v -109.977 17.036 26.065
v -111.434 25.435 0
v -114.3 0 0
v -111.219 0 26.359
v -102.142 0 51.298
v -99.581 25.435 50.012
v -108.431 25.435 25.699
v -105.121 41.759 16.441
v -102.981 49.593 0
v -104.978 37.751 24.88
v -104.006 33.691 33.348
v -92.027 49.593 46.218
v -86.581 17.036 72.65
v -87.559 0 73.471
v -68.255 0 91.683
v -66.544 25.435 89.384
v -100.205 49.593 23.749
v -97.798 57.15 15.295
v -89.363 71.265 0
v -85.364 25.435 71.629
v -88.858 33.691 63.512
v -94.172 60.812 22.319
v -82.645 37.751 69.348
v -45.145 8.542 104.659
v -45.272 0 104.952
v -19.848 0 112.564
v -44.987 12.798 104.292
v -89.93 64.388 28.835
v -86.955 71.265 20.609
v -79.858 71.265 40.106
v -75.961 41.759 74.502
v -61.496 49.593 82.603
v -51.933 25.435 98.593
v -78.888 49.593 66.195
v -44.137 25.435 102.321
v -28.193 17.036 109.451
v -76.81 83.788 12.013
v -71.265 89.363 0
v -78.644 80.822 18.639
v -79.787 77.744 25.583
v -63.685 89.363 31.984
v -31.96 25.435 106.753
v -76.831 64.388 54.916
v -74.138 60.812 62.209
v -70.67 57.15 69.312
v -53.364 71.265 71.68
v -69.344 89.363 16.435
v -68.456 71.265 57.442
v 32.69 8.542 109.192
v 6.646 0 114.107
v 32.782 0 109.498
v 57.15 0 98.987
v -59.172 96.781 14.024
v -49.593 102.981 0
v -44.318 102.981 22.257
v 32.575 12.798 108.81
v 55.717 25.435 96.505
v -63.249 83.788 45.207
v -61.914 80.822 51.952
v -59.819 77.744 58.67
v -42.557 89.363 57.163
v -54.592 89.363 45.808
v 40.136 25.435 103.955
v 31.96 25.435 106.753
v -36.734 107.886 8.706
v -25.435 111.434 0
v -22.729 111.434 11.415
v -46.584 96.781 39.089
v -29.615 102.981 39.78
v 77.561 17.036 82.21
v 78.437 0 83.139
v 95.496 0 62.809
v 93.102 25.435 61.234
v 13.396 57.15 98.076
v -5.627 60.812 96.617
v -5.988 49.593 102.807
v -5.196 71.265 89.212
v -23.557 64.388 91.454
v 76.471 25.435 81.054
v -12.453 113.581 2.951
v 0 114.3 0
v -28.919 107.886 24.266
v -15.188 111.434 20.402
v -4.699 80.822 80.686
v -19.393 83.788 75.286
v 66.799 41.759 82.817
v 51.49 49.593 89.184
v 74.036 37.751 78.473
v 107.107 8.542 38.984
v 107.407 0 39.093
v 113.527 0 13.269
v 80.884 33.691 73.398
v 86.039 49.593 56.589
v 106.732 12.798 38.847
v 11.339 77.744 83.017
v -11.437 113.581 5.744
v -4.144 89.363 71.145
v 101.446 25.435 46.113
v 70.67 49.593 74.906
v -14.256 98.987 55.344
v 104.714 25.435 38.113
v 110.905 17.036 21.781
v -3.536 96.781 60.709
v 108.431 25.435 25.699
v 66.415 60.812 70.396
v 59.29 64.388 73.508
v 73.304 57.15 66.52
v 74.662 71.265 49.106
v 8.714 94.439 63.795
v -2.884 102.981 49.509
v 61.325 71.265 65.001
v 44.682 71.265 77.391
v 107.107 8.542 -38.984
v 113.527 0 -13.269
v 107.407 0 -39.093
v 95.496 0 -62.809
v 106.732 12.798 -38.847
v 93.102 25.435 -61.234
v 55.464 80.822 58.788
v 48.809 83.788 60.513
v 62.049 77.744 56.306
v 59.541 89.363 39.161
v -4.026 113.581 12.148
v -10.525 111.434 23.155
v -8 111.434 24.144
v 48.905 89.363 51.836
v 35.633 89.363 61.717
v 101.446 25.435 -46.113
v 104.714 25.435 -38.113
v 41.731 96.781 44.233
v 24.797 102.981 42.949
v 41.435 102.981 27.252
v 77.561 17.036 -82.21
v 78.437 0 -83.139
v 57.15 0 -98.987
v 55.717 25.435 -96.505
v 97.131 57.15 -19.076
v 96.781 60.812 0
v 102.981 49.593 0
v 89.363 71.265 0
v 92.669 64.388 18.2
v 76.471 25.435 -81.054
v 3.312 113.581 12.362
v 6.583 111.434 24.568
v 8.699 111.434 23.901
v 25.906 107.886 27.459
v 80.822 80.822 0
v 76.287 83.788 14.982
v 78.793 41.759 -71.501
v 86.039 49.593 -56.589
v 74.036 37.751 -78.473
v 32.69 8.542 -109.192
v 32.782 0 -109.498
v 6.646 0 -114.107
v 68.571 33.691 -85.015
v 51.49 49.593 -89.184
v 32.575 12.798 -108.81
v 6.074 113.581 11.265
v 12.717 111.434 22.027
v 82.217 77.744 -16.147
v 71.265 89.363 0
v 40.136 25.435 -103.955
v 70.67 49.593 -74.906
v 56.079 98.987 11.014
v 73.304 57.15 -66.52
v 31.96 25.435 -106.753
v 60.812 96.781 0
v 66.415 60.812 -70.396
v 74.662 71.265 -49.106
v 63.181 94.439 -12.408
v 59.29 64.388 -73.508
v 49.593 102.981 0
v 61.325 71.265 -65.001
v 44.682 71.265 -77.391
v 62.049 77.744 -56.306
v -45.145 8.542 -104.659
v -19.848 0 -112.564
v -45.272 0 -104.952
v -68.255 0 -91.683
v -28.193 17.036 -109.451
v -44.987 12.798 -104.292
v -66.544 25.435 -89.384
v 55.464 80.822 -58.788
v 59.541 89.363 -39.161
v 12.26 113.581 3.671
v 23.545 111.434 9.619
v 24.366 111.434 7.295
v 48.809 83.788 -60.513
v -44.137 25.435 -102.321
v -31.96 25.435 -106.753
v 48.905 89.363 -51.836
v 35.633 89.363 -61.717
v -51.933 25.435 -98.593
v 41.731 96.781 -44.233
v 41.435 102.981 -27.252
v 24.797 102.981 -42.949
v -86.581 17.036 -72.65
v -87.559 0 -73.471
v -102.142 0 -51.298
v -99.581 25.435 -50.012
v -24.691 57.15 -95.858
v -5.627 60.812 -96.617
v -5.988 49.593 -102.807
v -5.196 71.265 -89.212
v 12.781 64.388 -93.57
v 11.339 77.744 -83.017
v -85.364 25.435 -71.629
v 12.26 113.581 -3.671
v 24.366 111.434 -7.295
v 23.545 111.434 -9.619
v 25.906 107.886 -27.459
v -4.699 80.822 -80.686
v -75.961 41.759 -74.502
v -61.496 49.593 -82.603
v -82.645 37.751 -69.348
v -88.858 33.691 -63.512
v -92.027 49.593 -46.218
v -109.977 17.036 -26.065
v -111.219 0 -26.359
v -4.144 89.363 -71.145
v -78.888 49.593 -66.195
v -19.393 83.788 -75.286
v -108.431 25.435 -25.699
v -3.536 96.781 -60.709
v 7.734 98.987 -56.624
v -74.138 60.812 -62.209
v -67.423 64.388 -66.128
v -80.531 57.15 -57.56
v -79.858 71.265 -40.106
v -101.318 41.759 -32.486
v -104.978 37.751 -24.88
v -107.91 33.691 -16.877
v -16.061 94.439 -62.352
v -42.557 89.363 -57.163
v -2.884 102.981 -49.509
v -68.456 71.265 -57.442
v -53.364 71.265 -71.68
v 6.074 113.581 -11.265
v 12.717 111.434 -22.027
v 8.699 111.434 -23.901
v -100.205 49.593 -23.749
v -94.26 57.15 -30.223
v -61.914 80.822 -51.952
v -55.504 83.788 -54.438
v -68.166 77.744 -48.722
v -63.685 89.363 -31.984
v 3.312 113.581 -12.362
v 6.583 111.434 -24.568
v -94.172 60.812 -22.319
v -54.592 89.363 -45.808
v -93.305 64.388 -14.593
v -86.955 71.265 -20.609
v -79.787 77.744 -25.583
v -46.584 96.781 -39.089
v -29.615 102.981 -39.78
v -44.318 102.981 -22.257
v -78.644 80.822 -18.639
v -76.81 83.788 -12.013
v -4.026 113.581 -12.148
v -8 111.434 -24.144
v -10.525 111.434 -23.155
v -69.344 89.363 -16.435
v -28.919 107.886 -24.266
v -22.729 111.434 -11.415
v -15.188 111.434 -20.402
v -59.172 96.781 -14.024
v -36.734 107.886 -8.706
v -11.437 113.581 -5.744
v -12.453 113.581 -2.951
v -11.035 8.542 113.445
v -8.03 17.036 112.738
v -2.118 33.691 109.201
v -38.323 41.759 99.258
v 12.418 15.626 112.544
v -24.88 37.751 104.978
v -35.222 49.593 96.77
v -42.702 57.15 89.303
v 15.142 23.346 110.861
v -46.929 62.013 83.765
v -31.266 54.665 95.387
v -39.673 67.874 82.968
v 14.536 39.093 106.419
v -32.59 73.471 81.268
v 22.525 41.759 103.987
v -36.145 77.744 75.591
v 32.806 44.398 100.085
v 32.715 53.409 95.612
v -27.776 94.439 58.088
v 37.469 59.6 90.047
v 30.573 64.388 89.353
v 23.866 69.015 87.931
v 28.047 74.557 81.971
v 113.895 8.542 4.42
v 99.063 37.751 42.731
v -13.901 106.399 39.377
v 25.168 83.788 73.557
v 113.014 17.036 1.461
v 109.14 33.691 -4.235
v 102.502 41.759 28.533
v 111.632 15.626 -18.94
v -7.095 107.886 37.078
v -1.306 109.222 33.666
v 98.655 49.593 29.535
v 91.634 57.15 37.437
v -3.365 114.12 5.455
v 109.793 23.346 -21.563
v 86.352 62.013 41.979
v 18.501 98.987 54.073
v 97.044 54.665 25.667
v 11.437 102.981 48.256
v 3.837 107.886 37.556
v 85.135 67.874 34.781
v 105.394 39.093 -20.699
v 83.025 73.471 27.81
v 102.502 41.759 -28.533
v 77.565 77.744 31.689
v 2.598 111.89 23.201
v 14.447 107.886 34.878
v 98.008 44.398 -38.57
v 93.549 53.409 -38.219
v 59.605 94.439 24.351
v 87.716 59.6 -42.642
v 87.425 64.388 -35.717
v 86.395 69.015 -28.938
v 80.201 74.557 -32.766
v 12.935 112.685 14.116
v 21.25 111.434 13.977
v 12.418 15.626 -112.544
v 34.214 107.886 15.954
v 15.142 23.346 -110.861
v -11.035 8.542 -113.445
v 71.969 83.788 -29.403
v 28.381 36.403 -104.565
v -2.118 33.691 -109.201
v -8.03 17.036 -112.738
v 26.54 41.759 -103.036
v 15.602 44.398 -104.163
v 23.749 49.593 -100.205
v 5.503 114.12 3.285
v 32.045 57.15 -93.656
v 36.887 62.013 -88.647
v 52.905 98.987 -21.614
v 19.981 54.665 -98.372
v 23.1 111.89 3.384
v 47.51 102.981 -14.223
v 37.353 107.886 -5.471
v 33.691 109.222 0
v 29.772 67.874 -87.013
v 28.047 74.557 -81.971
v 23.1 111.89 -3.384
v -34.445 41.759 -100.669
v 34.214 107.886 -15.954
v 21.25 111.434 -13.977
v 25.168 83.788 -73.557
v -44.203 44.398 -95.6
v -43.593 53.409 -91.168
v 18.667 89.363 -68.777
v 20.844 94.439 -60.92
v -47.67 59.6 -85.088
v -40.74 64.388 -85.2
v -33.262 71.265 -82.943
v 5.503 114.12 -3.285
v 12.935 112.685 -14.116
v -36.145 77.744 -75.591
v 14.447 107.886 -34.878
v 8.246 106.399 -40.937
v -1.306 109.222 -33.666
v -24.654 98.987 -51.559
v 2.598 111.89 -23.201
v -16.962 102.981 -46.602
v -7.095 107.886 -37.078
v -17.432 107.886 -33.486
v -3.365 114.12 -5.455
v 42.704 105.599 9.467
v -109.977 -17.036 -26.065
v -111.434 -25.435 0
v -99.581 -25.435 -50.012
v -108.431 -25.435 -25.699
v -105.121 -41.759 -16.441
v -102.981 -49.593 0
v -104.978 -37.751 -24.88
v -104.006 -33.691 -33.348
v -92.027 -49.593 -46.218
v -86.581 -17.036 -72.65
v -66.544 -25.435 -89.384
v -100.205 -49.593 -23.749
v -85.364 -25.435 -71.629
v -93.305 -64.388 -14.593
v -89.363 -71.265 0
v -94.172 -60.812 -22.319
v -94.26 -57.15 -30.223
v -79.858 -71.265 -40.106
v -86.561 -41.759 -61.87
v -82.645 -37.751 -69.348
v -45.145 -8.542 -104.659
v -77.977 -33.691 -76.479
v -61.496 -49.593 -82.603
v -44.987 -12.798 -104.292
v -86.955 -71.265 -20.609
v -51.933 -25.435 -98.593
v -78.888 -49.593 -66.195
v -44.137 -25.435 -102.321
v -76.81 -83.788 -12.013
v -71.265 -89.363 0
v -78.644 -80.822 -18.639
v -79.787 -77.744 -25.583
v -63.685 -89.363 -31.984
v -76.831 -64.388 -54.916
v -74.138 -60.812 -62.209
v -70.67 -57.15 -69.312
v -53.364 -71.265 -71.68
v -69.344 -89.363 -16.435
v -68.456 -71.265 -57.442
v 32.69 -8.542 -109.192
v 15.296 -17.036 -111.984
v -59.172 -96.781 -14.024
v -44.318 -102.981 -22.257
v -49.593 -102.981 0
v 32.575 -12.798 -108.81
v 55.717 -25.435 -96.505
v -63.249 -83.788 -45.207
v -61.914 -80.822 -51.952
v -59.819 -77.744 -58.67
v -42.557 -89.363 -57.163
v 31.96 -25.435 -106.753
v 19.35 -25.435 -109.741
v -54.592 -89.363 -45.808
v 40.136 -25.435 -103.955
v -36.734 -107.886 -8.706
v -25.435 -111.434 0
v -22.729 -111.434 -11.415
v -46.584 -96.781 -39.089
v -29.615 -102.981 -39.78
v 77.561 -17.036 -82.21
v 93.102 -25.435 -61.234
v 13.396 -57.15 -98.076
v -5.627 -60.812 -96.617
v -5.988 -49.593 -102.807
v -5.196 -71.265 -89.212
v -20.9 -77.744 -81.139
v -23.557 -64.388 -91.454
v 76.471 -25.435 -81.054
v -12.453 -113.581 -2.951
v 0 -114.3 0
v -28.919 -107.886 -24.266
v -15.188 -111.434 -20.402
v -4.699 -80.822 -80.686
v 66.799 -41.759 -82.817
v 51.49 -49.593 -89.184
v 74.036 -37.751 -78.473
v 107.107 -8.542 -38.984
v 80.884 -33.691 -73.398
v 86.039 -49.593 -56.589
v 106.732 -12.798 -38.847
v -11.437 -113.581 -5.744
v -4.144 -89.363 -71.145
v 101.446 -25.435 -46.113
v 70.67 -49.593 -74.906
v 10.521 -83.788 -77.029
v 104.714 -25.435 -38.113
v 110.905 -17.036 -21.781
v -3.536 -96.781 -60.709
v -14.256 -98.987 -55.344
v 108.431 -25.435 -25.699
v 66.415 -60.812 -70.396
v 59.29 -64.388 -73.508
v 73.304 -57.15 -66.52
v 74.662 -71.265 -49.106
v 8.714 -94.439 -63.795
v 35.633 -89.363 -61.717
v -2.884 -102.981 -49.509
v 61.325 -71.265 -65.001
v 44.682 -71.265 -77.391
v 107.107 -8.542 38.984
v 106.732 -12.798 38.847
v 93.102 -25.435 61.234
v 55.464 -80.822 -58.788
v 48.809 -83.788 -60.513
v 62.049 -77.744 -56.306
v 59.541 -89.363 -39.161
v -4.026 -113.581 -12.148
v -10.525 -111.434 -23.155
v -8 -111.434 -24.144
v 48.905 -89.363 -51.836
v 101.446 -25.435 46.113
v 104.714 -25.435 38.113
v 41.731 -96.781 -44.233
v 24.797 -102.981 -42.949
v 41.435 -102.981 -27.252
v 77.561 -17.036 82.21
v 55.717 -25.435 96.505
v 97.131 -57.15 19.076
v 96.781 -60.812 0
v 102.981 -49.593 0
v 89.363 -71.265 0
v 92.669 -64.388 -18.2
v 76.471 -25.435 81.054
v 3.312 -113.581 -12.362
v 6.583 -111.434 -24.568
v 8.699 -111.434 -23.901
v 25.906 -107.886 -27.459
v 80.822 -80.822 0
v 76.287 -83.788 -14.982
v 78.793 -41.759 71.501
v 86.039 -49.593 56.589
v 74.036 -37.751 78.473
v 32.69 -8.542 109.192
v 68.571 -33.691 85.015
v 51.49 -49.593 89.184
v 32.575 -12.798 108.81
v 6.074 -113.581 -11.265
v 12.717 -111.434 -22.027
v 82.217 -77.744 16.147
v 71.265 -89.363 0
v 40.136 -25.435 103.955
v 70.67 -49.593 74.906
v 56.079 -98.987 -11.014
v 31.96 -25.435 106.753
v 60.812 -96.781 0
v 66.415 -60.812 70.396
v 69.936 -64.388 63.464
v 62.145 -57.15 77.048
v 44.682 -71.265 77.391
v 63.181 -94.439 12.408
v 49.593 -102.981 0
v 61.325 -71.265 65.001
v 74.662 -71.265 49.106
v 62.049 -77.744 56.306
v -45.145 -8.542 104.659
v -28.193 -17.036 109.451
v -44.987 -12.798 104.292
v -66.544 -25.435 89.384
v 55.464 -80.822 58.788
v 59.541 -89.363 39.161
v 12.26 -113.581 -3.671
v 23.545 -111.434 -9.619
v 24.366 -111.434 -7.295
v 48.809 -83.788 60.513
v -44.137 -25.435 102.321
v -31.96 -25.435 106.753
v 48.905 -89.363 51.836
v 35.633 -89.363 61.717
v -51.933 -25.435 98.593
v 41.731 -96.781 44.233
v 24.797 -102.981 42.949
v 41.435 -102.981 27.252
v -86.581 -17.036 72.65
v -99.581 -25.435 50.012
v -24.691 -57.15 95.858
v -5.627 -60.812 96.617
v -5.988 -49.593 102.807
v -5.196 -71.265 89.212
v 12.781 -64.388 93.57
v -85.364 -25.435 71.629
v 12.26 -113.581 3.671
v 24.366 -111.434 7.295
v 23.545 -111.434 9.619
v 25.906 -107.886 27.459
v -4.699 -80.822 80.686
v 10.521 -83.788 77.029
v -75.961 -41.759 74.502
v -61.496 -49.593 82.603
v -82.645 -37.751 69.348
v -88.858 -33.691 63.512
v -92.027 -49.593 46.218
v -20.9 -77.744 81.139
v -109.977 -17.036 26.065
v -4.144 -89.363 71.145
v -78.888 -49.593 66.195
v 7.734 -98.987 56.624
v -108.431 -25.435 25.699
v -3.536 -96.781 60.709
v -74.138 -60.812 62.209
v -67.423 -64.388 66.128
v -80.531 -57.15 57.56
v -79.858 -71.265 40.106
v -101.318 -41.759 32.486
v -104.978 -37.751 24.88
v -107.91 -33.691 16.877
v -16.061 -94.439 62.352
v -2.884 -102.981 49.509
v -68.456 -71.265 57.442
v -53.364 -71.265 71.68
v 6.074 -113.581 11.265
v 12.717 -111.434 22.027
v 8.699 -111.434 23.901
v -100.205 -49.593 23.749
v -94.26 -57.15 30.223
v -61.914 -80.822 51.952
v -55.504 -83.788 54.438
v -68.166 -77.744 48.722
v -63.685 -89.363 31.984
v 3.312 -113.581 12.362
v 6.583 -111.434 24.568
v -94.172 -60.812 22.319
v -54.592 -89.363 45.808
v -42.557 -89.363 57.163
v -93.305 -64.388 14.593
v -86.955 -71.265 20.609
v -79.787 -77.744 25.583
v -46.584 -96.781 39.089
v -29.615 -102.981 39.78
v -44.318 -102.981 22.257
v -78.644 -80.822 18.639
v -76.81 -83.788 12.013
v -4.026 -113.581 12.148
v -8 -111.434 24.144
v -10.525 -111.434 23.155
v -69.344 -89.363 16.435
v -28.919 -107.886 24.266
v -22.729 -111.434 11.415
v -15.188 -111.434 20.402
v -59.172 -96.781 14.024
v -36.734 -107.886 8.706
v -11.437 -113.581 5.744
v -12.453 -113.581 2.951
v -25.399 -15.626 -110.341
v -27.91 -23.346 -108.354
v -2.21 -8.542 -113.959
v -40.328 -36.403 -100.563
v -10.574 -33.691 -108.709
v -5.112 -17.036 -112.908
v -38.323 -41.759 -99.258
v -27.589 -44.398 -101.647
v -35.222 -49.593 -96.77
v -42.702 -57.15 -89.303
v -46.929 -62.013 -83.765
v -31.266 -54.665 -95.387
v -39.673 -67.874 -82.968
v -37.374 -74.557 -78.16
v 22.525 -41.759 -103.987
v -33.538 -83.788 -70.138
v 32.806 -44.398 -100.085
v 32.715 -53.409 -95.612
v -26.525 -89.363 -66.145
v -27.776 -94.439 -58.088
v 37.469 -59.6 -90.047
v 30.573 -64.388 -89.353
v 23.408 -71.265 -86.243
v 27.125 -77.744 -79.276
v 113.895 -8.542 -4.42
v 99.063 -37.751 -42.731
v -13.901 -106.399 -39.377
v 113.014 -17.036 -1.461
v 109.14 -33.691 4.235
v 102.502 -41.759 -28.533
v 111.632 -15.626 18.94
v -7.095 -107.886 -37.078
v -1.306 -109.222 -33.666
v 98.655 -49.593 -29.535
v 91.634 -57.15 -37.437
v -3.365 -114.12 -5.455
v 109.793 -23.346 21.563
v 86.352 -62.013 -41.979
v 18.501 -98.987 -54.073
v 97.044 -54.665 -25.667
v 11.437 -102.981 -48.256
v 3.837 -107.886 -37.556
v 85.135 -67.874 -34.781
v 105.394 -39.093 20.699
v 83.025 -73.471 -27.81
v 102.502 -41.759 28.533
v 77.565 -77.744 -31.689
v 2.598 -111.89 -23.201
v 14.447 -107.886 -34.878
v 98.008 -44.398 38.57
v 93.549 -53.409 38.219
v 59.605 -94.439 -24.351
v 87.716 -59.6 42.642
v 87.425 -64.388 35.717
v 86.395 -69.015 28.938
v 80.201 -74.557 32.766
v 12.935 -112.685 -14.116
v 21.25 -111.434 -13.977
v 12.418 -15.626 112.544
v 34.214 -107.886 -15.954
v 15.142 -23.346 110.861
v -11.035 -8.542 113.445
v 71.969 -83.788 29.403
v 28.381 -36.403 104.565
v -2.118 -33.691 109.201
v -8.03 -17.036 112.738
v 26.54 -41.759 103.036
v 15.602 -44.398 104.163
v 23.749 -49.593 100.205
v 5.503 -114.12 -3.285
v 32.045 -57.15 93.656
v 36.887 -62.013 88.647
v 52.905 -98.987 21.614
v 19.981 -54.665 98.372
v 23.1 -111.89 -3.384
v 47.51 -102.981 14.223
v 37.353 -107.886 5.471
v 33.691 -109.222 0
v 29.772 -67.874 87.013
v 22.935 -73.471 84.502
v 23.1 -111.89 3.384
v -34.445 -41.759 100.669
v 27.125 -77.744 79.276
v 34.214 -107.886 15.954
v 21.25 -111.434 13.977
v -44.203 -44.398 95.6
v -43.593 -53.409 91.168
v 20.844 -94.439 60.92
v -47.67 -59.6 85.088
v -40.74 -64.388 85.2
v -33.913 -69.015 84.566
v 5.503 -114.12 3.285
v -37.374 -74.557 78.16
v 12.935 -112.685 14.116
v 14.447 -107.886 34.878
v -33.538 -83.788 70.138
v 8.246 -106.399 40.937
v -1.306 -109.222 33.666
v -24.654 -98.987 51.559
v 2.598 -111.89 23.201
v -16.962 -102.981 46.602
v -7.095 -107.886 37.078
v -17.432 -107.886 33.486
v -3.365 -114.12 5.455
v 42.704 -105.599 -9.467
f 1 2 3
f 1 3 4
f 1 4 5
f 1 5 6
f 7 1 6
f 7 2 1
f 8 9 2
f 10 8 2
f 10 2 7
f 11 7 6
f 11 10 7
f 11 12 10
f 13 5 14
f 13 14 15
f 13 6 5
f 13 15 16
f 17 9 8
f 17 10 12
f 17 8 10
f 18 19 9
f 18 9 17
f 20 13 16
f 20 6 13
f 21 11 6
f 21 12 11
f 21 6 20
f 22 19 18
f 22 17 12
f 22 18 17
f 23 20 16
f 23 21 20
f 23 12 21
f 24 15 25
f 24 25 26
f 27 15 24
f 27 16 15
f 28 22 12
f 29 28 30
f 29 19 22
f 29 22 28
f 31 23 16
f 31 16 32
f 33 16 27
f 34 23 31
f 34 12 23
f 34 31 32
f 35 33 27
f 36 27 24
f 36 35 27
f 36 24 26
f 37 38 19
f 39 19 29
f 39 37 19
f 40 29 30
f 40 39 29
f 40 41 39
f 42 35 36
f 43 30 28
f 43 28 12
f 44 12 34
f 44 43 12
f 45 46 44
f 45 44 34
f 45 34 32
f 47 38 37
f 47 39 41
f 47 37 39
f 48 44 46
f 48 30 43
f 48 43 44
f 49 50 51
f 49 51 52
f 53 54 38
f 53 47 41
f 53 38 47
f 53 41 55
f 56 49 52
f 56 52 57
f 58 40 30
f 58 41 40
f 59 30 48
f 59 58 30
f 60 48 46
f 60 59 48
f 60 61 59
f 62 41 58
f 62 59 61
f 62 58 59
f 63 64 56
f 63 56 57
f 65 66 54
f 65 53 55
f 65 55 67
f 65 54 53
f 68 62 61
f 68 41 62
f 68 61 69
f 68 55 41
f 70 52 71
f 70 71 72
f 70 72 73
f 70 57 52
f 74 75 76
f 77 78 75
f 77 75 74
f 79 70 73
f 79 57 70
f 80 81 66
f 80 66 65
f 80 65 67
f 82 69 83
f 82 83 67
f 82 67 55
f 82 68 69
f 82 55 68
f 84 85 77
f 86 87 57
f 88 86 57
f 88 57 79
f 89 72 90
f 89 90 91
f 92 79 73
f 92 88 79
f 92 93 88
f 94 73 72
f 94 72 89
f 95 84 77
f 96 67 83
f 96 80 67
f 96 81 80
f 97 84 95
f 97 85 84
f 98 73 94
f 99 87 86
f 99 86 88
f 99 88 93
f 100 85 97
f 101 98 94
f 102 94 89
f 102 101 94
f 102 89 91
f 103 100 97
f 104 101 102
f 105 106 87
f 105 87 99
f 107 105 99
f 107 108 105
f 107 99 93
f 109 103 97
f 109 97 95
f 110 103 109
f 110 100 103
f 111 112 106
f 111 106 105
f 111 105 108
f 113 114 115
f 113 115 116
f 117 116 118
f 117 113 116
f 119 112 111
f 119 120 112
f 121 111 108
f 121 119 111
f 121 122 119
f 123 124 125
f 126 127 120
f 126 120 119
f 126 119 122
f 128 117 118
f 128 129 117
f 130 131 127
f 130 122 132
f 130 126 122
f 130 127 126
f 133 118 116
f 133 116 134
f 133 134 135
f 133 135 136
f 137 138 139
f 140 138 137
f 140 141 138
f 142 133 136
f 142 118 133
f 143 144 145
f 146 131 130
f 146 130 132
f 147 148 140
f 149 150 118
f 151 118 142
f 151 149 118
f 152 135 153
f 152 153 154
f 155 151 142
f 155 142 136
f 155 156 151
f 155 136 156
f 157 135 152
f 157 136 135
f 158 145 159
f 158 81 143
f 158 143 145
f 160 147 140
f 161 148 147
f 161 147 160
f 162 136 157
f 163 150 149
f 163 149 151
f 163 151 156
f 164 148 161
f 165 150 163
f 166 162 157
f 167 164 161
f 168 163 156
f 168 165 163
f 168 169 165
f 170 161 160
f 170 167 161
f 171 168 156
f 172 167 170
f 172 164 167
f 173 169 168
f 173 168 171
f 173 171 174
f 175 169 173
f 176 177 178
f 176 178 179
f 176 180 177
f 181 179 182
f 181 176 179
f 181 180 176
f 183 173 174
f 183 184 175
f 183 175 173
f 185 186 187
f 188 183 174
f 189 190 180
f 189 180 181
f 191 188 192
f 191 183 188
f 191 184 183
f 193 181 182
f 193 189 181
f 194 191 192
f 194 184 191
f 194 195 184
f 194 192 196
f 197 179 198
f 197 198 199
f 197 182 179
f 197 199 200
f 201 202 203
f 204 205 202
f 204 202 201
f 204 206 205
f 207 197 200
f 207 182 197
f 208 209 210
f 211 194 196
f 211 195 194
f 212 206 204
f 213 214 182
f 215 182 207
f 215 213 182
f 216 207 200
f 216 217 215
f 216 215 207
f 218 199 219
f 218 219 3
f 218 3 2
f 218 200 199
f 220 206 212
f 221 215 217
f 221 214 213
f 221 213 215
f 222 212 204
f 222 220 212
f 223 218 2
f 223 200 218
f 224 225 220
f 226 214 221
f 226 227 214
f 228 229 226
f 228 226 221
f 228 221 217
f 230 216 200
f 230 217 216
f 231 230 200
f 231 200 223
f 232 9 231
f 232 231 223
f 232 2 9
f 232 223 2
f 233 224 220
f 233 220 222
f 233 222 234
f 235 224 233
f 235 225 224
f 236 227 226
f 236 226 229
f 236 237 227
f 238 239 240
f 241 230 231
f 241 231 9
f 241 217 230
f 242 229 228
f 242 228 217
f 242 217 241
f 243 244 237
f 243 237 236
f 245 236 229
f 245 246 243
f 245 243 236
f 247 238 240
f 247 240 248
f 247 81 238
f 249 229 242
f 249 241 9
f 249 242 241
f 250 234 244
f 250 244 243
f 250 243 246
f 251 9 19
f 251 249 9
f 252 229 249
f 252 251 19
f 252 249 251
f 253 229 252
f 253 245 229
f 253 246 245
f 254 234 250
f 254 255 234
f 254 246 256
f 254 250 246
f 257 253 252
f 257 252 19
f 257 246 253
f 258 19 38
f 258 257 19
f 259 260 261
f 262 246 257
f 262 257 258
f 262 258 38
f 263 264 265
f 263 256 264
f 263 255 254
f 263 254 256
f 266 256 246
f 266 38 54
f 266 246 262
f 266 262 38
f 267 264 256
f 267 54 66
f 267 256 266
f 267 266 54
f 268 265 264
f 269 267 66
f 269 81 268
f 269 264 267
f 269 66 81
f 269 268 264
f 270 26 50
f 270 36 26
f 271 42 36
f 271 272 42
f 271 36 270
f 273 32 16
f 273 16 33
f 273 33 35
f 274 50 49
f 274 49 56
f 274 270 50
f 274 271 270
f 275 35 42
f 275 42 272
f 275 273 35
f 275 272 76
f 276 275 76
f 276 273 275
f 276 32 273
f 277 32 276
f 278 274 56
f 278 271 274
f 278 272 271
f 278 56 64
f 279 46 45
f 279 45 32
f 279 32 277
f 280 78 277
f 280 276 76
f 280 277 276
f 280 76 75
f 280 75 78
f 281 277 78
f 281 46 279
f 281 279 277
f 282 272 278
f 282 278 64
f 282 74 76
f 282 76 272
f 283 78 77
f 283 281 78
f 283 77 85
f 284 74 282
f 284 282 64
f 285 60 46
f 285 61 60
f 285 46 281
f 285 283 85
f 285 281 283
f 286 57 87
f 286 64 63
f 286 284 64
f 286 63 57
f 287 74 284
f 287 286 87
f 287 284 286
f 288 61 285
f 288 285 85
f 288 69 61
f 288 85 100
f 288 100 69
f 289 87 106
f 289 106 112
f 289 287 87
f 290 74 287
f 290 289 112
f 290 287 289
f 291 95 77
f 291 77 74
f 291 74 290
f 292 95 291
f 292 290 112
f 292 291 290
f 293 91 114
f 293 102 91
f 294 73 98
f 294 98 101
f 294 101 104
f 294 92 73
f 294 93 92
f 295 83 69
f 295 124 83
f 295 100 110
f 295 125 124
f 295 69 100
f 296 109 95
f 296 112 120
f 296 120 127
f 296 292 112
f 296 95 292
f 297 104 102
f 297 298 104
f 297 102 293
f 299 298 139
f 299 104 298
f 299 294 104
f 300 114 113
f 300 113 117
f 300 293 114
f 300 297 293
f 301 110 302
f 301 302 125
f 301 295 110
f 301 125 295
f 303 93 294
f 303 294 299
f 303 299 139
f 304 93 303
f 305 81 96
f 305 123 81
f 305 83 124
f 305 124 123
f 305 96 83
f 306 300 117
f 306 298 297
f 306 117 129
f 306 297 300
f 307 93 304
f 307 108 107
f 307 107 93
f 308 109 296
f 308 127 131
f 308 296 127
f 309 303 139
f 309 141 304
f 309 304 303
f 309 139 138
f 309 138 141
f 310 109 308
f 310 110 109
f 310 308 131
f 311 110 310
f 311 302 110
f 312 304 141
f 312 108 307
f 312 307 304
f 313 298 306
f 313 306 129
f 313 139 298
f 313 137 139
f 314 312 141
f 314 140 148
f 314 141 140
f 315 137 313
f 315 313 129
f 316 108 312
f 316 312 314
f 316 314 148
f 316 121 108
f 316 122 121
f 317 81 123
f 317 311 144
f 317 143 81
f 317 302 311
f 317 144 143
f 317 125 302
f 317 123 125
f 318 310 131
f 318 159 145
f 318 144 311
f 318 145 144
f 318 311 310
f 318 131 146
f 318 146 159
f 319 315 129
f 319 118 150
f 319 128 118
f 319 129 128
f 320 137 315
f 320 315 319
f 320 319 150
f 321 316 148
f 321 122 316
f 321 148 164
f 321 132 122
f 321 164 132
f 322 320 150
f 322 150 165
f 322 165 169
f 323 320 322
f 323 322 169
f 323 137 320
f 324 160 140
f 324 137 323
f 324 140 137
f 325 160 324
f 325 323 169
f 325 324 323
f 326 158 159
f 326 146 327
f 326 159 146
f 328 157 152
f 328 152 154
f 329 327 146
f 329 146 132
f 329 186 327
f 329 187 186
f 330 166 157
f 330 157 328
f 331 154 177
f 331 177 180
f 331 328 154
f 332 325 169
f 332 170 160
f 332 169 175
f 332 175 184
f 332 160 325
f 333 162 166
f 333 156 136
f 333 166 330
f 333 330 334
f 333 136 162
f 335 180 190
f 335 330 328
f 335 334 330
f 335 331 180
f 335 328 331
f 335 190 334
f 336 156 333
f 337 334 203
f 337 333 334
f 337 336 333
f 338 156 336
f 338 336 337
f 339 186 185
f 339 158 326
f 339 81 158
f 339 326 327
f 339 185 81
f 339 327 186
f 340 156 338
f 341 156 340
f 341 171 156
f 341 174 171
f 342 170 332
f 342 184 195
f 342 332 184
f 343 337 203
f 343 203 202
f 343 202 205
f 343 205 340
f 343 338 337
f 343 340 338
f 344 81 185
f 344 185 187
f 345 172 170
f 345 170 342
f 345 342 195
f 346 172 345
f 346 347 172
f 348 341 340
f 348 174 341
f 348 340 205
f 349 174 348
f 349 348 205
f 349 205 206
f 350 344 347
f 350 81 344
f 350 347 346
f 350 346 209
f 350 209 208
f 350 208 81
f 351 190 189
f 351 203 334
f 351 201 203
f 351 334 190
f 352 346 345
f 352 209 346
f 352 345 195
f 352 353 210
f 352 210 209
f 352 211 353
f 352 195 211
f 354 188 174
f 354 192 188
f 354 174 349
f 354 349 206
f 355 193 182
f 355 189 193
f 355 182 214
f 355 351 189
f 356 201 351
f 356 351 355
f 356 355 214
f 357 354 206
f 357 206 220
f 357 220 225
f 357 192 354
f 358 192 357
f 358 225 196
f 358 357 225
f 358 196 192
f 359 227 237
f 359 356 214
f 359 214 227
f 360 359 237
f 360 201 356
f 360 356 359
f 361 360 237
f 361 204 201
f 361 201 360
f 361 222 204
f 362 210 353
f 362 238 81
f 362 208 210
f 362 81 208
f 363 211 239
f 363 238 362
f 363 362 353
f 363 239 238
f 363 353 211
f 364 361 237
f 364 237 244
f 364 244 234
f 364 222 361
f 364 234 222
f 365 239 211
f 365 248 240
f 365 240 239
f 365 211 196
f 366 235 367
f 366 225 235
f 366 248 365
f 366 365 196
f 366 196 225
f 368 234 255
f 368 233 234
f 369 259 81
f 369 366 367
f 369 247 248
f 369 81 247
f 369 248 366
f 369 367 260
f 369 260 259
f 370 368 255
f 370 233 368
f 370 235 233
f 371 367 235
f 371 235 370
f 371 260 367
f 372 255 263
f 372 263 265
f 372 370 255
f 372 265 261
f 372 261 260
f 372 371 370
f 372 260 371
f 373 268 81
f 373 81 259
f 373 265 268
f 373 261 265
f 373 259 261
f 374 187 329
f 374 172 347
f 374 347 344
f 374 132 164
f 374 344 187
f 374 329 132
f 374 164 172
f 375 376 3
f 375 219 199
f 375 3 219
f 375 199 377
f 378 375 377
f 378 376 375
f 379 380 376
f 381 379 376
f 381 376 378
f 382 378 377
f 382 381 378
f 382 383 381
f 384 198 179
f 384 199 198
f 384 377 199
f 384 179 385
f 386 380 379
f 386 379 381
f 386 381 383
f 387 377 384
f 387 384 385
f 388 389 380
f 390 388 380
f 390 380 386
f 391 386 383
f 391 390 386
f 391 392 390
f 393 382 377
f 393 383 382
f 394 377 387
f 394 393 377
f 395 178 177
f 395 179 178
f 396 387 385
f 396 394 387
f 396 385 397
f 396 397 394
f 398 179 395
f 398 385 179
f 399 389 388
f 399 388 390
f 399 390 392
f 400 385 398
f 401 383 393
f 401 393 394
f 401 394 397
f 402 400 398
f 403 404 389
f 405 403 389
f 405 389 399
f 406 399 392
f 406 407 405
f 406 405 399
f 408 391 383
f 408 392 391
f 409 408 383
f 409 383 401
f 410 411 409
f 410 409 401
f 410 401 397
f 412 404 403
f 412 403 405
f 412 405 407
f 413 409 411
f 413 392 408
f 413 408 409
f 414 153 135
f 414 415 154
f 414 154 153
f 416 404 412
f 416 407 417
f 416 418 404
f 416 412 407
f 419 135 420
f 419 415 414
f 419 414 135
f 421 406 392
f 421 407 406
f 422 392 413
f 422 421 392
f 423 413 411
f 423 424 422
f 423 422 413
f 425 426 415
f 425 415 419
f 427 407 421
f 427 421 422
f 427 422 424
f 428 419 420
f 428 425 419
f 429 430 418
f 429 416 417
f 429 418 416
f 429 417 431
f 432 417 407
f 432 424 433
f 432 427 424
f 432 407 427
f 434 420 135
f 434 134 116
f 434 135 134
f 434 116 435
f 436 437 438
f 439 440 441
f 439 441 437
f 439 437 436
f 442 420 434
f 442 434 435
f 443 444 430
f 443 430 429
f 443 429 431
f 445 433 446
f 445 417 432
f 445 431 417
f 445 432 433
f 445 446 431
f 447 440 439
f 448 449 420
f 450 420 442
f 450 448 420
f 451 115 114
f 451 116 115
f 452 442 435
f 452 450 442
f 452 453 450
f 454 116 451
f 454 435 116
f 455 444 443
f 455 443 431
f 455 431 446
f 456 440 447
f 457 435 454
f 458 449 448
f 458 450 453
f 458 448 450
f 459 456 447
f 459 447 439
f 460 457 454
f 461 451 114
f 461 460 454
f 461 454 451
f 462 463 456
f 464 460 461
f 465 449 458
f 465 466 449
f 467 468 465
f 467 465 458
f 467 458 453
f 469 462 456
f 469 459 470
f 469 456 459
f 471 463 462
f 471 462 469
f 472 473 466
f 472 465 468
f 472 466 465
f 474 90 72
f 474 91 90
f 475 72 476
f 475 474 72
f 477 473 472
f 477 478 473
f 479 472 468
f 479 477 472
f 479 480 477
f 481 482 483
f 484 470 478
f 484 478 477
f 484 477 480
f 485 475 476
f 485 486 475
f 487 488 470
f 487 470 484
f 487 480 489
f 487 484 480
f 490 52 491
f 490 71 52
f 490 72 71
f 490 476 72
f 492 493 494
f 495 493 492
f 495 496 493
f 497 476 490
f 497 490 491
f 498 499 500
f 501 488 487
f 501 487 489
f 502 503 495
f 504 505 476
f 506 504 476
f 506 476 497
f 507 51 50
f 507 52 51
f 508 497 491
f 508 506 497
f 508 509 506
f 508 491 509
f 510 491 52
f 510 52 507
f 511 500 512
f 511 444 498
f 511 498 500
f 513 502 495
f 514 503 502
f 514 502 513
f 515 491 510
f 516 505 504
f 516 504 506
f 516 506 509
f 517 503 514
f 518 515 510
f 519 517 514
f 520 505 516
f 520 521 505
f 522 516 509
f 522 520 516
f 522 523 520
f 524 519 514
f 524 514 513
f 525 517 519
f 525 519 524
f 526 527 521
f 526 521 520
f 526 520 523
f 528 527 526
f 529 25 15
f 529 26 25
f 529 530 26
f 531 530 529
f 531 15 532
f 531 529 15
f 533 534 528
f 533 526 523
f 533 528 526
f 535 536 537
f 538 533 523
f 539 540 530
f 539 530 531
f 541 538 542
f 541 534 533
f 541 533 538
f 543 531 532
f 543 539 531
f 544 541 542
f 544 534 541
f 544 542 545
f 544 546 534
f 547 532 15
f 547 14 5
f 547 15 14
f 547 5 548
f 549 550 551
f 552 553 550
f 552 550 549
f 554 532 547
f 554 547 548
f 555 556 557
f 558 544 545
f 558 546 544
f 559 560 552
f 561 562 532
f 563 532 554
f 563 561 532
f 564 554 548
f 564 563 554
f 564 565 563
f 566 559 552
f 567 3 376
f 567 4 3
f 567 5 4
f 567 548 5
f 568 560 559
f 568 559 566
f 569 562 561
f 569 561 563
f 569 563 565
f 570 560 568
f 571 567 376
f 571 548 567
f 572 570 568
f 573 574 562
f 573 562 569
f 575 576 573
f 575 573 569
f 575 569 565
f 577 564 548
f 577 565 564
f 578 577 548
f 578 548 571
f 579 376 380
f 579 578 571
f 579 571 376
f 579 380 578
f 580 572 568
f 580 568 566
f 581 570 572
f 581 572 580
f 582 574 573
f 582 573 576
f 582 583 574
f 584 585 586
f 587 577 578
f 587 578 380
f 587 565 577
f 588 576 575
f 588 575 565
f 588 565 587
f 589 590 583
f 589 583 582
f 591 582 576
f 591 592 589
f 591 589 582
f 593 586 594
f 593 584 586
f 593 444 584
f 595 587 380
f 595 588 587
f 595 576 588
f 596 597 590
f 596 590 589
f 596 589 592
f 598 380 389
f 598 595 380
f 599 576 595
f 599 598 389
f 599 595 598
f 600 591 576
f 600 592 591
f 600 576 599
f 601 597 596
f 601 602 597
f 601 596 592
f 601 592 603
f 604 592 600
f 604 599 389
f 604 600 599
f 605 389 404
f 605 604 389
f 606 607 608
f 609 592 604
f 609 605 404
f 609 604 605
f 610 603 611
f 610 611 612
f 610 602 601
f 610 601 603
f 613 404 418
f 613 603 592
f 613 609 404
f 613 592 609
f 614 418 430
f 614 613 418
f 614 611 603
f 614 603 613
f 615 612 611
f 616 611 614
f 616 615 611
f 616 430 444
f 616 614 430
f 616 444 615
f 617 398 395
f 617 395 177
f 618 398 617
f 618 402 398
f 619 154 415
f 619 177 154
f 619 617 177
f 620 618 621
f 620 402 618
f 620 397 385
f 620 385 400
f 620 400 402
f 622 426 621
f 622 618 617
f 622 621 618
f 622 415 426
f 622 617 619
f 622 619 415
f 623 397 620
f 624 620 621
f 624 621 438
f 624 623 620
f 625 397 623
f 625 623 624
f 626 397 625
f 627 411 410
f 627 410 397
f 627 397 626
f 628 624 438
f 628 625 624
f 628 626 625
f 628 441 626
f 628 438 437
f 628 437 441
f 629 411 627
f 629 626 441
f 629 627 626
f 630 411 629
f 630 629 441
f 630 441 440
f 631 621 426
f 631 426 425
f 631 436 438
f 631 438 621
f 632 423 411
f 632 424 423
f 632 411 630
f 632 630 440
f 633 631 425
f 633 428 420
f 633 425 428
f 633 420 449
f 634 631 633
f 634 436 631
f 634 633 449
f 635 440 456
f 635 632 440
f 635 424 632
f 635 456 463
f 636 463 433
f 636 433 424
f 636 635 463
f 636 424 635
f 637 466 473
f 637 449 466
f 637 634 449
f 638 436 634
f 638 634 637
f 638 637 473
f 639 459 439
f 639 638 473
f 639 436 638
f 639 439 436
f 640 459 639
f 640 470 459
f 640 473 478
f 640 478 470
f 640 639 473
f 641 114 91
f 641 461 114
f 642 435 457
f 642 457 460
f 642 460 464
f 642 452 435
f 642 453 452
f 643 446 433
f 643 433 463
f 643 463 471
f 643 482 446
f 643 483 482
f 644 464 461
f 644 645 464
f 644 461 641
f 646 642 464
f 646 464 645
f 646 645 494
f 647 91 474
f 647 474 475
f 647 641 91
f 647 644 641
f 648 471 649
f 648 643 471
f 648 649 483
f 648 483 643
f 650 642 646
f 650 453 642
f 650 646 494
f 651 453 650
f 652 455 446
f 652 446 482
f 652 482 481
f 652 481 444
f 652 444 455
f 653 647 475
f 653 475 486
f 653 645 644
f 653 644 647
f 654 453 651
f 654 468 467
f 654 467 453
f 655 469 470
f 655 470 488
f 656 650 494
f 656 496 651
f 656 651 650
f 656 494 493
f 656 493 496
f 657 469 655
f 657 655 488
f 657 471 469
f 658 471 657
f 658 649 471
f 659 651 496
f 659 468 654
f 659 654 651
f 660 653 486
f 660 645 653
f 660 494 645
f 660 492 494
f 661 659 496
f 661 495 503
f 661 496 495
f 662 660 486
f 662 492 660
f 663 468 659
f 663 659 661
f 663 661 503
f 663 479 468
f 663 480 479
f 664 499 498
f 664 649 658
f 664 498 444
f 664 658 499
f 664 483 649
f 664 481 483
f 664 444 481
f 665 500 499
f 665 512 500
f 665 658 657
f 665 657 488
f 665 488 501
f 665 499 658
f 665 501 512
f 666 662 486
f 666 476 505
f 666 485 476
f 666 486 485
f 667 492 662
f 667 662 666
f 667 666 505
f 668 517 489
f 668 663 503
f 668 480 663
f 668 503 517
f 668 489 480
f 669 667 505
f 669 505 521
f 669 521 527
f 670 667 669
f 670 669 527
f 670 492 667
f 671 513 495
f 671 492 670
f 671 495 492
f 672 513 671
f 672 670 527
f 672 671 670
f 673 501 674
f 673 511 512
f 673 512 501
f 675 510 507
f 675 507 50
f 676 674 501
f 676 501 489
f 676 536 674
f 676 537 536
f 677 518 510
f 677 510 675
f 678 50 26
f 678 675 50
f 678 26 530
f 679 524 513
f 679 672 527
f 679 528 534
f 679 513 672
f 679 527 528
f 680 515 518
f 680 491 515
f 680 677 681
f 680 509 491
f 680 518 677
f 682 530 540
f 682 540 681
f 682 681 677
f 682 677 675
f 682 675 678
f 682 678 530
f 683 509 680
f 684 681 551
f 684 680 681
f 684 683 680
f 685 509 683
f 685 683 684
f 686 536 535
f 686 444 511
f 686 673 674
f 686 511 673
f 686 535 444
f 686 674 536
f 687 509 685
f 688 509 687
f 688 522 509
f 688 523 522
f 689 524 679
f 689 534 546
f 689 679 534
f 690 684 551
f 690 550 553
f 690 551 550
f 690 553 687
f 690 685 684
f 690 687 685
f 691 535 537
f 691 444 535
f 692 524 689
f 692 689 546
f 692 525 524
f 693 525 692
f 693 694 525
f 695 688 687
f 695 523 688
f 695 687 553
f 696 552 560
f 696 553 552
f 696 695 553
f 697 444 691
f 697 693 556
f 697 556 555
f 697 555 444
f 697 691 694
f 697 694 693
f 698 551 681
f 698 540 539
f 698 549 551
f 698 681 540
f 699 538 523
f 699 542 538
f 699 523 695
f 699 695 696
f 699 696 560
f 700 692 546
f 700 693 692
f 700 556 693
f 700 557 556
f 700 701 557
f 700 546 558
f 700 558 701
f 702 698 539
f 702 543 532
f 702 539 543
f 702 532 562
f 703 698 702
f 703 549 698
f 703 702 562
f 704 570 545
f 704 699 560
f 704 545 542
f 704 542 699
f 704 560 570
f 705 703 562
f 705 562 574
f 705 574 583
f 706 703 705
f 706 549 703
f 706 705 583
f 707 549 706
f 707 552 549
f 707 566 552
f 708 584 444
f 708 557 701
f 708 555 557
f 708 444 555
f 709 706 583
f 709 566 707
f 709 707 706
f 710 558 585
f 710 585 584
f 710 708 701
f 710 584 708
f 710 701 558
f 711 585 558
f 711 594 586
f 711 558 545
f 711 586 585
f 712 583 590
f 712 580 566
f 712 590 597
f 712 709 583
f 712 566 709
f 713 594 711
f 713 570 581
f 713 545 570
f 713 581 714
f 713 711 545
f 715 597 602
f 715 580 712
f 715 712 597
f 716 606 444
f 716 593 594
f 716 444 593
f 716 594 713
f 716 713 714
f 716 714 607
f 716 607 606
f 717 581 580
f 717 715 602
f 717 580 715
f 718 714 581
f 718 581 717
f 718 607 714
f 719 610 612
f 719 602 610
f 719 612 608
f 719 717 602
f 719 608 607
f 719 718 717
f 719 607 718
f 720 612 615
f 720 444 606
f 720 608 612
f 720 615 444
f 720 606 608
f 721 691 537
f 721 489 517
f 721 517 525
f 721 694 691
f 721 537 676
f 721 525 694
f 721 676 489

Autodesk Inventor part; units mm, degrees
ref_plane "YZ Plane" through (0, 0, 0) normal (1, 0, 0) x (0, 1, 0)
ref_plane "XZ Plane" through (0, 0, 0) normal (0, 1, 0) x (-1, 0, 0)
ref_plane "XY Plane" through (0, 0, 0) normal (0, 0, 1) x (1, 0, 0)
sketch "Sketch1" plane through (0, 0, 0) normal (0, 1, 0) x (-1, 0, 0)
  circle A0 centre (0, 0) radius 114.3
  dimension "d0" = 228.6
extrude "Extrusion1" add sketch "Sketch1" along normal mid plane 228.6
fillet "Fillet1" radius 114.3 1 edges at (114.3, 114.3, 0)
fillet "Fillet2" radius 114.3 1 edges at (114.3, -114.3, 0)
properties part number "Ball" material "GFRC"
